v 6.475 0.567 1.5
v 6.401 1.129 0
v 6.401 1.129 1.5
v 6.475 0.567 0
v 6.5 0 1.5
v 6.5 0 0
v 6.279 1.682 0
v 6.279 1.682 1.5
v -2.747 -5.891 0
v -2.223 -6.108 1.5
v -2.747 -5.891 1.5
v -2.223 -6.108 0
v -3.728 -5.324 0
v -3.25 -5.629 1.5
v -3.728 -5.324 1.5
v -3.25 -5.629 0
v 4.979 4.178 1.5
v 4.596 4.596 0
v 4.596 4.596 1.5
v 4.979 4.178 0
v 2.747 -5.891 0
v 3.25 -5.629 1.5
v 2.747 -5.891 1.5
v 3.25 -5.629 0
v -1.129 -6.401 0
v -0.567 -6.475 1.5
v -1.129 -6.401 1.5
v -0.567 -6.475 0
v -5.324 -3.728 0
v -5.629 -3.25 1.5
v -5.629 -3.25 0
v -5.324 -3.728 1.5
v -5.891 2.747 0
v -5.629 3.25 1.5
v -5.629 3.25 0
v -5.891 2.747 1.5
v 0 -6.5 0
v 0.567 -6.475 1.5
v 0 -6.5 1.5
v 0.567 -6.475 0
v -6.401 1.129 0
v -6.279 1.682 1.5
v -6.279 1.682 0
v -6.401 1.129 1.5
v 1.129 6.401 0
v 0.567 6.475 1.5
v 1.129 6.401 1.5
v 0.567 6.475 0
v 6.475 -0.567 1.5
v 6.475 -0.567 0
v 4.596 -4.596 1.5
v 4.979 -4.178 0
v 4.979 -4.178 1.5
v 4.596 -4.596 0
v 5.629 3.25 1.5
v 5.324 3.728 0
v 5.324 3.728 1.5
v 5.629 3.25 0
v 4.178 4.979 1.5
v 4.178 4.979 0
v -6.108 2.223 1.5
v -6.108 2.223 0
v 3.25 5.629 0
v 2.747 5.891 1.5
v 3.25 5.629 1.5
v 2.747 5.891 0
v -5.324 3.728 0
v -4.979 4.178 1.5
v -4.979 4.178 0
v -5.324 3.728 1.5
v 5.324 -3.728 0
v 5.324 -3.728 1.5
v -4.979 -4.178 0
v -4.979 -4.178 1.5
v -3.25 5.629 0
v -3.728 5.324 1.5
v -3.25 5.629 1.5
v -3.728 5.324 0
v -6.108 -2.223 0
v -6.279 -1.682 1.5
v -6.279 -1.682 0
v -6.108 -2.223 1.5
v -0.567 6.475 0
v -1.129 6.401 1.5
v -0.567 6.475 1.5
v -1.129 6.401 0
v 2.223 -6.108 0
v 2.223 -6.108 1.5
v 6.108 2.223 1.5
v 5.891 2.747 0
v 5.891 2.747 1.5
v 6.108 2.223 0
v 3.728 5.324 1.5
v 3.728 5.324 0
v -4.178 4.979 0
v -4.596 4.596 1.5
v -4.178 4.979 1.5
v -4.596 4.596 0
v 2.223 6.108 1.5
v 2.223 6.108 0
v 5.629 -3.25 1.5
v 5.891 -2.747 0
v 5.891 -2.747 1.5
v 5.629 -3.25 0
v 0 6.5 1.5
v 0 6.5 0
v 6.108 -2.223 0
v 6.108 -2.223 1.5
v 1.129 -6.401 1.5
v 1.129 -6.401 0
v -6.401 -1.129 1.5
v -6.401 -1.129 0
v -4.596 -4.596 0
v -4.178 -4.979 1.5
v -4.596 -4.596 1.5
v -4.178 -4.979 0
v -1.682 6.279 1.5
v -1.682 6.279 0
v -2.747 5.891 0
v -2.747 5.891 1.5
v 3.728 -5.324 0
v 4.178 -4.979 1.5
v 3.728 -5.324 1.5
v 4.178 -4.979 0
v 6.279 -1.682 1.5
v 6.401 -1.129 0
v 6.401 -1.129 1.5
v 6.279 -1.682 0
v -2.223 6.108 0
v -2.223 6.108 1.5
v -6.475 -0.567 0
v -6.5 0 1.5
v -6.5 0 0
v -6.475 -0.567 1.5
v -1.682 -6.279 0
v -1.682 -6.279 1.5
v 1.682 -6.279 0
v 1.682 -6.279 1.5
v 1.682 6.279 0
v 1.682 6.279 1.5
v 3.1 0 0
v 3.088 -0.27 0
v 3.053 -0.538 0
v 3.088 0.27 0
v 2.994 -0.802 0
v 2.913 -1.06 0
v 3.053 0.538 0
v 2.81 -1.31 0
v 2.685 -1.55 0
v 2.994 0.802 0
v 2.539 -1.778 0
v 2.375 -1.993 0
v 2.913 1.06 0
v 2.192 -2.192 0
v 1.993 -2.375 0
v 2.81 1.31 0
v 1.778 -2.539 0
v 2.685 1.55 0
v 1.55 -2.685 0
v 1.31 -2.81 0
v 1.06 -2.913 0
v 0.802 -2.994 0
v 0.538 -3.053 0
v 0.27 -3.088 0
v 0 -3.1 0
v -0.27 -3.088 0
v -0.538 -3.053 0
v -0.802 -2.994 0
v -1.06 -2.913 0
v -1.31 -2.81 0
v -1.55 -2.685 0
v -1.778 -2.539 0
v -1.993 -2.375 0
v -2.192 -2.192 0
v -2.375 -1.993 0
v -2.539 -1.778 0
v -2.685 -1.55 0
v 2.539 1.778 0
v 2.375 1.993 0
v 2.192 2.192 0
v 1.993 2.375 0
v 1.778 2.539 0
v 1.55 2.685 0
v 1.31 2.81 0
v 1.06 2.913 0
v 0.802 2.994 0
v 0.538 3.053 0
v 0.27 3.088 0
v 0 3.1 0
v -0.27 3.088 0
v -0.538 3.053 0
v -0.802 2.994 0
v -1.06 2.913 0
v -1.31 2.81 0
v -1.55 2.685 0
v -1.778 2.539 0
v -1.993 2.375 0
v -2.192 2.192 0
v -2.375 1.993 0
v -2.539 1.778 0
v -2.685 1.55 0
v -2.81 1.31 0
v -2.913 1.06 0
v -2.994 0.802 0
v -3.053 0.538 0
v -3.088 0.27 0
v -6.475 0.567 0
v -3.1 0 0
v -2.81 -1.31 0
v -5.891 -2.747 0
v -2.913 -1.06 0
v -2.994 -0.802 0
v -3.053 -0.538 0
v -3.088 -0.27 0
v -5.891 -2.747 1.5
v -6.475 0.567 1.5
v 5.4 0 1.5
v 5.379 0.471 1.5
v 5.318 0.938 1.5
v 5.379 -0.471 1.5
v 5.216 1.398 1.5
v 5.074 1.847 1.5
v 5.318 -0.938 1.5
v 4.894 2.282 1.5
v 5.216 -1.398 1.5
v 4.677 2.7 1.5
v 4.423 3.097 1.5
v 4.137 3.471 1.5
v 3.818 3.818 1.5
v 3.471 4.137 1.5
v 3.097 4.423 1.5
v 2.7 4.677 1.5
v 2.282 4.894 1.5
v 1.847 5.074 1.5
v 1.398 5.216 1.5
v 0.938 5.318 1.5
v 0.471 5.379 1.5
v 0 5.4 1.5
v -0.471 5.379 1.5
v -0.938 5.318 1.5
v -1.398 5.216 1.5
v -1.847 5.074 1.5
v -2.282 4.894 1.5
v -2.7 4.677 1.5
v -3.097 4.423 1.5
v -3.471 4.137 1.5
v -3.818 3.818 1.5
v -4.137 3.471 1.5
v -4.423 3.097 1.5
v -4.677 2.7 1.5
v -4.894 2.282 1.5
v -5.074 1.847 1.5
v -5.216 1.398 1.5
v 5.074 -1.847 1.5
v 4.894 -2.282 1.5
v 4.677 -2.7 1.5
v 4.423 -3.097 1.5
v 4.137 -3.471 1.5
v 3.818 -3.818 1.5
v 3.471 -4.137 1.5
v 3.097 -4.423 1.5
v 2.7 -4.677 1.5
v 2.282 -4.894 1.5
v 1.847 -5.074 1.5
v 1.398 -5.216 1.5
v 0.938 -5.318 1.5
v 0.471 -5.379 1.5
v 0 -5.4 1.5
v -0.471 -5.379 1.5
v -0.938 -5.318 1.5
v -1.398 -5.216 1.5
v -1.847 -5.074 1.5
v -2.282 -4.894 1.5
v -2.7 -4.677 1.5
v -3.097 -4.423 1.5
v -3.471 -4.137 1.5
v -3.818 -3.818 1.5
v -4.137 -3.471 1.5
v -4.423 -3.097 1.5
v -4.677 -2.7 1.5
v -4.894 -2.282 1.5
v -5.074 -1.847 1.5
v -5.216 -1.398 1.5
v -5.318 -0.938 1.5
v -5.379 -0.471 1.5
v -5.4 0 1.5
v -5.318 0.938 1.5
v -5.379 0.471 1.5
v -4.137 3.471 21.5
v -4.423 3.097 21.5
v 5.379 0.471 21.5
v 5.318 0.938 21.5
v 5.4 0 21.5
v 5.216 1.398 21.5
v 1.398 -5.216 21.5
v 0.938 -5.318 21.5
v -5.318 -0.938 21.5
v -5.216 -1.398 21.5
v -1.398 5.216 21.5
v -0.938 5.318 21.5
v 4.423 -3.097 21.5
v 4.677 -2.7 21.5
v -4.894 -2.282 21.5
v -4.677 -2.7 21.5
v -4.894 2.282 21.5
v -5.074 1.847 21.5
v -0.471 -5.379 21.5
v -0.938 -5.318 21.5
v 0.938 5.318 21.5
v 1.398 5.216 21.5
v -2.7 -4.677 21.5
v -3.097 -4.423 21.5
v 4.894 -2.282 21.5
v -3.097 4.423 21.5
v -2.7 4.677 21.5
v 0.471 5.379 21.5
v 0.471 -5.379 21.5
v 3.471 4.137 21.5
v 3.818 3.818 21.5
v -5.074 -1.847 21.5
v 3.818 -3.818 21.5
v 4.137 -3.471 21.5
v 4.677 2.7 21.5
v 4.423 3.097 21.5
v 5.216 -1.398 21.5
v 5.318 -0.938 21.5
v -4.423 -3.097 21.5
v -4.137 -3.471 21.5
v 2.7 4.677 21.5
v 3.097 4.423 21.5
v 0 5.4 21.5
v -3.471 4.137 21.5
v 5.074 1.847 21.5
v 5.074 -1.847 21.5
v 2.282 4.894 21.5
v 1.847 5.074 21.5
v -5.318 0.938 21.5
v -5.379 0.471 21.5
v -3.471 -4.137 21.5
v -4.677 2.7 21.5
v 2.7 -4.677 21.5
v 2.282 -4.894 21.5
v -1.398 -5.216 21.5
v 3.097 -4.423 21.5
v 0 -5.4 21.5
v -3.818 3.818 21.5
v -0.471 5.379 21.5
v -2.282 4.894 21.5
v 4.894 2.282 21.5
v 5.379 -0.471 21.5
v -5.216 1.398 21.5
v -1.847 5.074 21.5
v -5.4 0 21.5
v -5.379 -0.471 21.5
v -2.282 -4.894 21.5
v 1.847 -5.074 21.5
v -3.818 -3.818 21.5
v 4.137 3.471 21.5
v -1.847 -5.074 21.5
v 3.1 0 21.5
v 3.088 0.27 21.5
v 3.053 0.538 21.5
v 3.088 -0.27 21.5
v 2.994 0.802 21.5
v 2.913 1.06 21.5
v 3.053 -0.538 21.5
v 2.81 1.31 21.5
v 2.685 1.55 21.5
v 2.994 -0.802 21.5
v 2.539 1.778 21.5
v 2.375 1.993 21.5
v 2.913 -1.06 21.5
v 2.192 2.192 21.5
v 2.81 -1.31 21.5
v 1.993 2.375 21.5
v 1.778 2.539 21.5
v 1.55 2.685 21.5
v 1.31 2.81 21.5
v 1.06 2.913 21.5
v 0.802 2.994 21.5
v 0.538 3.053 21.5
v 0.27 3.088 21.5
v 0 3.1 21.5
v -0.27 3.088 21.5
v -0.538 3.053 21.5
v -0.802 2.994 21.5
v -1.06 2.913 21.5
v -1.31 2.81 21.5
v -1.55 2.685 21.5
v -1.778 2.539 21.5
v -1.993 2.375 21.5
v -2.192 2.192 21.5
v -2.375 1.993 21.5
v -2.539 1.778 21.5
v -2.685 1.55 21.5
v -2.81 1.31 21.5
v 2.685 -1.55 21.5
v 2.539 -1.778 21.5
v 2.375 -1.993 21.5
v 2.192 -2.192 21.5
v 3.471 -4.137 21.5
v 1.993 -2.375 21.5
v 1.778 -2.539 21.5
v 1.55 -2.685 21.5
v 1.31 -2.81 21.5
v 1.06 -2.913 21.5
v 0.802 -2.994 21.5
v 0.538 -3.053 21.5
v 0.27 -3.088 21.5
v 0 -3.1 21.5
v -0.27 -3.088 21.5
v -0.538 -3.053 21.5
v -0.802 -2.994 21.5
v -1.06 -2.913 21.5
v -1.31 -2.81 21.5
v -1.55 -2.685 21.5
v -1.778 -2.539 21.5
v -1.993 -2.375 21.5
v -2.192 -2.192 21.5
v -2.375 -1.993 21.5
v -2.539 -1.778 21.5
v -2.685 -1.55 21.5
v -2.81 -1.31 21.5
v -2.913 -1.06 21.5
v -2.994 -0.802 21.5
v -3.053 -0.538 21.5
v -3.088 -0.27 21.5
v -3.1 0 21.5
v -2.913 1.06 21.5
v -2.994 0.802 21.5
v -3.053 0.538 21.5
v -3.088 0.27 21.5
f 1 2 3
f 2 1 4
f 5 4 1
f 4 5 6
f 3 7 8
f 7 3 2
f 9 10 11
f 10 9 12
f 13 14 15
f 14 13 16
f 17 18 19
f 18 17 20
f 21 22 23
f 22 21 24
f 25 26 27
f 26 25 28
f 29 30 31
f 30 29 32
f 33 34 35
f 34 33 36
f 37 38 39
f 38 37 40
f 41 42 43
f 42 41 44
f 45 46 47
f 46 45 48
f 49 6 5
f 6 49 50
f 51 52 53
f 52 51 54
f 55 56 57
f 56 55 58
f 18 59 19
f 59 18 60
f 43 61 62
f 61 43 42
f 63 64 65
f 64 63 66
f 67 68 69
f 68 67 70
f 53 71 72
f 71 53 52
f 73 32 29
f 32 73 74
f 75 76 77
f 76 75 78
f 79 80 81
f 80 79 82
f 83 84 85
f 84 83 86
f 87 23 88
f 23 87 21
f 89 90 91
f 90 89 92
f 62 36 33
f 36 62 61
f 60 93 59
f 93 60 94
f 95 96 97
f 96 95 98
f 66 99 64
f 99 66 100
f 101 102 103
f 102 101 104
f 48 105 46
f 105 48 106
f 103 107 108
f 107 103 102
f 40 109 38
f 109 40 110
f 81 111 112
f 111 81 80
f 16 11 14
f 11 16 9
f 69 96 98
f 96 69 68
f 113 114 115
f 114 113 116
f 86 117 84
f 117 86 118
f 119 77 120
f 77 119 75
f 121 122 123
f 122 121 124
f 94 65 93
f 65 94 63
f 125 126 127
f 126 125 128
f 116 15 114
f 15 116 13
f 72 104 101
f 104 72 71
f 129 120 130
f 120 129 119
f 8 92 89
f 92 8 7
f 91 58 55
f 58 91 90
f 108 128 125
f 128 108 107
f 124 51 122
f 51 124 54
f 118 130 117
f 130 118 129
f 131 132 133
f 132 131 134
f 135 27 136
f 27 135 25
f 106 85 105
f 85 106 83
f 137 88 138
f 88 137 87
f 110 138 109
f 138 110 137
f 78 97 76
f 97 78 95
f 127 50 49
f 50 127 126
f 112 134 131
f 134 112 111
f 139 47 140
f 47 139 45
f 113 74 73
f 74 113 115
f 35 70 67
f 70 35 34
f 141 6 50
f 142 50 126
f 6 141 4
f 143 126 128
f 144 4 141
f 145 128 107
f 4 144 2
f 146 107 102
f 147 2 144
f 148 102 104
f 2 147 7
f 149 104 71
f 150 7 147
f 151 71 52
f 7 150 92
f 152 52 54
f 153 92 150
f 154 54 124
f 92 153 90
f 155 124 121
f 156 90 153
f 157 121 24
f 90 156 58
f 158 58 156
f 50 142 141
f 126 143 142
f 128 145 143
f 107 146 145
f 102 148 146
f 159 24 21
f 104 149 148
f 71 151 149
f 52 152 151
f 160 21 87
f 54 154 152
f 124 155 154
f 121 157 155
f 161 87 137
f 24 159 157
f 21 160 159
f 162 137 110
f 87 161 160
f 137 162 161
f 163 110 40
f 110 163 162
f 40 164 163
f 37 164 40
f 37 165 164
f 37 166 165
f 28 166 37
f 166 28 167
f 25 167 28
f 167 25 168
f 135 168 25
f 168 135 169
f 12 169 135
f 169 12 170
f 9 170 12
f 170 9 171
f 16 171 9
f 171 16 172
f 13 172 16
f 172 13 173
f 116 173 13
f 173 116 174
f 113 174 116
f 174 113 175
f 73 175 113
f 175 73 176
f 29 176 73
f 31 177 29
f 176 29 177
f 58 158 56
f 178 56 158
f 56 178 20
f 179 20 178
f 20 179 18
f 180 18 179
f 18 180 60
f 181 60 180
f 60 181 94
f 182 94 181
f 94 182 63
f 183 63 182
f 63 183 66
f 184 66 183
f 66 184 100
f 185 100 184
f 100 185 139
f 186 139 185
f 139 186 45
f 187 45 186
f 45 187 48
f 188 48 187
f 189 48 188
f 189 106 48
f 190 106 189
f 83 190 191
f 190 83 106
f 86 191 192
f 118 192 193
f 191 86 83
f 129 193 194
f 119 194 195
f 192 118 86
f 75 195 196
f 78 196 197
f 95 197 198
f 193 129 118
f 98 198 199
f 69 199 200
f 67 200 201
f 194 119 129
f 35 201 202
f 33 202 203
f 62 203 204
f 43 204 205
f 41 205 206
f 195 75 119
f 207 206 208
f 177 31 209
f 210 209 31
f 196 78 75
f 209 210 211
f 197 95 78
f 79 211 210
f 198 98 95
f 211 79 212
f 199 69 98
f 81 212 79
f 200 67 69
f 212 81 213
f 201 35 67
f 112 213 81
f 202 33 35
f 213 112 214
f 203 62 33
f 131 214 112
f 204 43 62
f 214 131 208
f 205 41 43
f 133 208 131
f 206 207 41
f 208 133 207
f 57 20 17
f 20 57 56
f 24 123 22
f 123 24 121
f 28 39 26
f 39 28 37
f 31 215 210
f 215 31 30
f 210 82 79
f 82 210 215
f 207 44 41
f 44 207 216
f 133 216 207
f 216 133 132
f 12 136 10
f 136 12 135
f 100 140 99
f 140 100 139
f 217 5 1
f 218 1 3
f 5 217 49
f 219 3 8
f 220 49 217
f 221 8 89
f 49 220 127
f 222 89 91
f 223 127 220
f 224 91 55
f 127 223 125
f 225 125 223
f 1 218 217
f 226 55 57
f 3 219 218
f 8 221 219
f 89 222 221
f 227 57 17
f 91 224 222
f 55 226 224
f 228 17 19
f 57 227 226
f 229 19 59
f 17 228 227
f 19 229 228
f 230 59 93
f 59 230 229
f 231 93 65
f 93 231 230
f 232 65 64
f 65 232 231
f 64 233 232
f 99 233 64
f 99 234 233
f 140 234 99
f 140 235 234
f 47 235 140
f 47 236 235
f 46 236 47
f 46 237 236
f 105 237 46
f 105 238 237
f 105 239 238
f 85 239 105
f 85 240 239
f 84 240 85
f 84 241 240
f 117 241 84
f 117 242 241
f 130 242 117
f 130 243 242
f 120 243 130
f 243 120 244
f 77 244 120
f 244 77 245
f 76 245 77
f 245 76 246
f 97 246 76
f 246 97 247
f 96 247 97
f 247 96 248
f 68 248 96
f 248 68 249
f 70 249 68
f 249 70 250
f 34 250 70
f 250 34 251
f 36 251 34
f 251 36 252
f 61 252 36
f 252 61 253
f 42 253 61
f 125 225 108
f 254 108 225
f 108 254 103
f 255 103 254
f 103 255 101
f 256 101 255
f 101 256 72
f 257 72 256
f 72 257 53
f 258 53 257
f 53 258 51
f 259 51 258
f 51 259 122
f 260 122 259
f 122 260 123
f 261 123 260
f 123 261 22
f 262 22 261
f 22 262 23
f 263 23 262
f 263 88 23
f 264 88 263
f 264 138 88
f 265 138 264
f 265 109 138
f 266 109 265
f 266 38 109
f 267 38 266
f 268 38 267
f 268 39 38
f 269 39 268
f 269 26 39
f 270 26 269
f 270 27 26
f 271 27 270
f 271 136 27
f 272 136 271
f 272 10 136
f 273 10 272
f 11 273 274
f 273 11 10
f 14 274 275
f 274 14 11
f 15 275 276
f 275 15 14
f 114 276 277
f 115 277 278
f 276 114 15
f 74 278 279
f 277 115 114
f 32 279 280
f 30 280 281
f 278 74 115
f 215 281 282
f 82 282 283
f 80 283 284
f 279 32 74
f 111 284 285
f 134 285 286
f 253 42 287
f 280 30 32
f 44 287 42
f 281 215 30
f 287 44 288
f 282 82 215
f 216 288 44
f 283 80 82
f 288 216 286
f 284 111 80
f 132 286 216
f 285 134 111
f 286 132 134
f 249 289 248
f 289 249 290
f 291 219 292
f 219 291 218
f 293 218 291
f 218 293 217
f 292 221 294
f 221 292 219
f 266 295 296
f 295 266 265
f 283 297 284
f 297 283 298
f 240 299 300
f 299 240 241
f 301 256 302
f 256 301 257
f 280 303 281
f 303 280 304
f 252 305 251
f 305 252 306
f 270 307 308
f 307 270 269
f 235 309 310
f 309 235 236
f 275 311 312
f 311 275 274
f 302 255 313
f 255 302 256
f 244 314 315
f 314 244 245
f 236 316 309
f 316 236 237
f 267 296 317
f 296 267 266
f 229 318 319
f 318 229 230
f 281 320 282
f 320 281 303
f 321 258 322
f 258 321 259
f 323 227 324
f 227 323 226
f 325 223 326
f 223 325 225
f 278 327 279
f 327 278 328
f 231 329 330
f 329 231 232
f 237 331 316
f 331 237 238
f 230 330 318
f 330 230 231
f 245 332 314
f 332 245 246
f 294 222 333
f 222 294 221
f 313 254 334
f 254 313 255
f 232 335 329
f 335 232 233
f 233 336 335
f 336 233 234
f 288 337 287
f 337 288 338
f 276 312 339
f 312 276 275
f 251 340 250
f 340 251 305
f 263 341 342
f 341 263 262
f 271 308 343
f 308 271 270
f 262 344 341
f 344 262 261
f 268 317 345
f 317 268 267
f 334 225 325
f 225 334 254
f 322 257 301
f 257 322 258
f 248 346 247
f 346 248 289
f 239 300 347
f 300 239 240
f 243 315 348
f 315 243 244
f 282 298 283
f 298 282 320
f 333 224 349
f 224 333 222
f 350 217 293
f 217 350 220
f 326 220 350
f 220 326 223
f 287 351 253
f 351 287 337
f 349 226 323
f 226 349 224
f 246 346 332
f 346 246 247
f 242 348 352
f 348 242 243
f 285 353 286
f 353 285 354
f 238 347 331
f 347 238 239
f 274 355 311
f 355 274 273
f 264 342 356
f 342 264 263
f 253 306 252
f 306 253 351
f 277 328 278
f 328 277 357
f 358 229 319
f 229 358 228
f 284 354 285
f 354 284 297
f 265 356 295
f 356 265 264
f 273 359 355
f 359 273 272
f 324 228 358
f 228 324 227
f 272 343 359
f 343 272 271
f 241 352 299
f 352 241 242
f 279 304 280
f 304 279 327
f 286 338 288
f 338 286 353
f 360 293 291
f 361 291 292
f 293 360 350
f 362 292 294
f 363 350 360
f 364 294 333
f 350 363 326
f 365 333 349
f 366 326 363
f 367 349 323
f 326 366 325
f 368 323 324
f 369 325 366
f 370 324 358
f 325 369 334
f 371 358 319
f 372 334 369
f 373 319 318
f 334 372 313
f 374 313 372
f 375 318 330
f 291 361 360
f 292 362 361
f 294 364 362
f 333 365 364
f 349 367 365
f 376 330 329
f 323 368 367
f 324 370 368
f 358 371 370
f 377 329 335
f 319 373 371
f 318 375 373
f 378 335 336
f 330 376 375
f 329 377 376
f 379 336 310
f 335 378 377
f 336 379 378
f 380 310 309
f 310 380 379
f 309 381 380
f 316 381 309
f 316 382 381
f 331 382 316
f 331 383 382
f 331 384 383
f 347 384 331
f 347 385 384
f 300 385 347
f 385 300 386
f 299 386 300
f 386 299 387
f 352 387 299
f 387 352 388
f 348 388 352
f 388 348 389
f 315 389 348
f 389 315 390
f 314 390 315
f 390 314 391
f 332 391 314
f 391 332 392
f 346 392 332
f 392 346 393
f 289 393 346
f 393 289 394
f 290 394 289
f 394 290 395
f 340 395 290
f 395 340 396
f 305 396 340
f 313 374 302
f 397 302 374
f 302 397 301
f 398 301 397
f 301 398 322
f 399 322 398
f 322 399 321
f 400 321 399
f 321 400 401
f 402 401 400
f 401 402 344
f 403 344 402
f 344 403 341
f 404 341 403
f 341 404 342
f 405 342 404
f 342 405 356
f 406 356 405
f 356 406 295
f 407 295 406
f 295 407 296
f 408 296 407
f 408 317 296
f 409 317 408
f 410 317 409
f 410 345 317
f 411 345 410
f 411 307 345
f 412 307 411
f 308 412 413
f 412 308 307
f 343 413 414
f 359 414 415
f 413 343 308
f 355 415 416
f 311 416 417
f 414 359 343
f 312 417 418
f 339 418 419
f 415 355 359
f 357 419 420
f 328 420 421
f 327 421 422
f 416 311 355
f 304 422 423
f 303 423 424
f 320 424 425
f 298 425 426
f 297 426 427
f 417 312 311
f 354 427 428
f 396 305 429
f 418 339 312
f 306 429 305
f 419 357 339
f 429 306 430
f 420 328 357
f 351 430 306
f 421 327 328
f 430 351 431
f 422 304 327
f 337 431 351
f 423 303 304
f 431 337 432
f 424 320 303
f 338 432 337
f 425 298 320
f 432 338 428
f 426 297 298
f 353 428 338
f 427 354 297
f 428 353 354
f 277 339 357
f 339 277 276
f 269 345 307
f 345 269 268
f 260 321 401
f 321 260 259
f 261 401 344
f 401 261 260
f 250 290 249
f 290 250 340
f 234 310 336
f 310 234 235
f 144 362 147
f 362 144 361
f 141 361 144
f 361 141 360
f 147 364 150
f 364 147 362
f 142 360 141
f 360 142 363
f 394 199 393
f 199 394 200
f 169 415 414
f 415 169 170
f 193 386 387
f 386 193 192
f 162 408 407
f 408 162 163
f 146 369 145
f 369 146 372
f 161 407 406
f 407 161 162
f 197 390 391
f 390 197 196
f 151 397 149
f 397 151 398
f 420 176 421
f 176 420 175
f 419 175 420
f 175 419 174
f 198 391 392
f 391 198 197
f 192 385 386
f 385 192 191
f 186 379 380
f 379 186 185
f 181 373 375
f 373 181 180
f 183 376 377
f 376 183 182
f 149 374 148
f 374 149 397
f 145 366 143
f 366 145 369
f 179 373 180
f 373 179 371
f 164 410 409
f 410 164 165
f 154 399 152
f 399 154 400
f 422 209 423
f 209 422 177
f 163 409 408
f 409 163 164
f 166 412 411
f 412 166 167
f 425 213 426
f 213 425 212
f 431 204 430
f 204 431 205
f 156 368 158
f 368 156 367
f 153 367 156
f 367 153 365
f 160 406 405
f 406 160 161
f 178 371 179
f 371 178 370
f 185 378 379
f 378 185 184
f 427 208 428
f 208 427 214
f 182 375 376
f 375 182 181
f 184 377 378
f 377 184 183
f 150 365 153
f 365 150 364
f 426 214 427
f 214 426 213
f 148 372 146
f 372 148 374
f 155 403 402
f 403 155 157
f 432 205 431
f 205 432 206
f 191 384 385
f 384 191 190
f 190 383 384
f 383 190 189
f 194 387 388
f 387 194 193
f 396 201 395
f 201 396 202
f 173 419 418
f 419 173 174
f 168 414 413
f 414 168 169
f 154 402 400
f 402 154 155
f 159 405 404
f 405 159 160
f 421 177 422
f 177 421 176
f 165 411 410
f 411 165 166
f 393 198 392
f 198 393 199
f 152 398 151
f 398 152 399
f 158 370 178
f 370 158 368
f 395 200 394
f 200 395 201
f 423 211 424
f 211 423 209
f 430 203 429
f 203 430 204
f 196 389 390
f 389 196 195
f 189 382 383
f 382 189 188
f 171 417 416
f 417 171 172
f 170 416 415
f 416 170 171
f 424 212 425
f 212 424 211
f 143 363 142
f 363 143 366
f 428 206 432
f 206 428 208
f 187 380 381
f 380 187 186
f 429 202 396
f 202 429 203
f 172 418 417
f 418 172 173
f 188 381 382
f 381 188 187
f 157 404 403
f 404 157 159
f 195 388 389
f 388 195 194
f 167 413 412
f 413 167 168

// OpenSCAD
// Adapter sleeve - a collar with a sleeve body that lines a 1.5 mL tube rack hole to hold a
// 0.2 mL PCR tube. Printed upside down so the collar lies on the bed and the sleeve rises up.
// NOVEL general part.

collar_d  = 13;
collar_h  = 1.5;
body_d    = 10.8;
body_h    = 21.5;
bore      = 6.2;

$fn = 72;

collar_t = 1.5;

difference() {
    union() {
        cylinder(h = collar_h, d = collar_d);
        cylinder(h = body_h, d = body_d);
    }
    translate([0, 0, -1]) cylinder(h = body_h + 2, d = bore);
}
